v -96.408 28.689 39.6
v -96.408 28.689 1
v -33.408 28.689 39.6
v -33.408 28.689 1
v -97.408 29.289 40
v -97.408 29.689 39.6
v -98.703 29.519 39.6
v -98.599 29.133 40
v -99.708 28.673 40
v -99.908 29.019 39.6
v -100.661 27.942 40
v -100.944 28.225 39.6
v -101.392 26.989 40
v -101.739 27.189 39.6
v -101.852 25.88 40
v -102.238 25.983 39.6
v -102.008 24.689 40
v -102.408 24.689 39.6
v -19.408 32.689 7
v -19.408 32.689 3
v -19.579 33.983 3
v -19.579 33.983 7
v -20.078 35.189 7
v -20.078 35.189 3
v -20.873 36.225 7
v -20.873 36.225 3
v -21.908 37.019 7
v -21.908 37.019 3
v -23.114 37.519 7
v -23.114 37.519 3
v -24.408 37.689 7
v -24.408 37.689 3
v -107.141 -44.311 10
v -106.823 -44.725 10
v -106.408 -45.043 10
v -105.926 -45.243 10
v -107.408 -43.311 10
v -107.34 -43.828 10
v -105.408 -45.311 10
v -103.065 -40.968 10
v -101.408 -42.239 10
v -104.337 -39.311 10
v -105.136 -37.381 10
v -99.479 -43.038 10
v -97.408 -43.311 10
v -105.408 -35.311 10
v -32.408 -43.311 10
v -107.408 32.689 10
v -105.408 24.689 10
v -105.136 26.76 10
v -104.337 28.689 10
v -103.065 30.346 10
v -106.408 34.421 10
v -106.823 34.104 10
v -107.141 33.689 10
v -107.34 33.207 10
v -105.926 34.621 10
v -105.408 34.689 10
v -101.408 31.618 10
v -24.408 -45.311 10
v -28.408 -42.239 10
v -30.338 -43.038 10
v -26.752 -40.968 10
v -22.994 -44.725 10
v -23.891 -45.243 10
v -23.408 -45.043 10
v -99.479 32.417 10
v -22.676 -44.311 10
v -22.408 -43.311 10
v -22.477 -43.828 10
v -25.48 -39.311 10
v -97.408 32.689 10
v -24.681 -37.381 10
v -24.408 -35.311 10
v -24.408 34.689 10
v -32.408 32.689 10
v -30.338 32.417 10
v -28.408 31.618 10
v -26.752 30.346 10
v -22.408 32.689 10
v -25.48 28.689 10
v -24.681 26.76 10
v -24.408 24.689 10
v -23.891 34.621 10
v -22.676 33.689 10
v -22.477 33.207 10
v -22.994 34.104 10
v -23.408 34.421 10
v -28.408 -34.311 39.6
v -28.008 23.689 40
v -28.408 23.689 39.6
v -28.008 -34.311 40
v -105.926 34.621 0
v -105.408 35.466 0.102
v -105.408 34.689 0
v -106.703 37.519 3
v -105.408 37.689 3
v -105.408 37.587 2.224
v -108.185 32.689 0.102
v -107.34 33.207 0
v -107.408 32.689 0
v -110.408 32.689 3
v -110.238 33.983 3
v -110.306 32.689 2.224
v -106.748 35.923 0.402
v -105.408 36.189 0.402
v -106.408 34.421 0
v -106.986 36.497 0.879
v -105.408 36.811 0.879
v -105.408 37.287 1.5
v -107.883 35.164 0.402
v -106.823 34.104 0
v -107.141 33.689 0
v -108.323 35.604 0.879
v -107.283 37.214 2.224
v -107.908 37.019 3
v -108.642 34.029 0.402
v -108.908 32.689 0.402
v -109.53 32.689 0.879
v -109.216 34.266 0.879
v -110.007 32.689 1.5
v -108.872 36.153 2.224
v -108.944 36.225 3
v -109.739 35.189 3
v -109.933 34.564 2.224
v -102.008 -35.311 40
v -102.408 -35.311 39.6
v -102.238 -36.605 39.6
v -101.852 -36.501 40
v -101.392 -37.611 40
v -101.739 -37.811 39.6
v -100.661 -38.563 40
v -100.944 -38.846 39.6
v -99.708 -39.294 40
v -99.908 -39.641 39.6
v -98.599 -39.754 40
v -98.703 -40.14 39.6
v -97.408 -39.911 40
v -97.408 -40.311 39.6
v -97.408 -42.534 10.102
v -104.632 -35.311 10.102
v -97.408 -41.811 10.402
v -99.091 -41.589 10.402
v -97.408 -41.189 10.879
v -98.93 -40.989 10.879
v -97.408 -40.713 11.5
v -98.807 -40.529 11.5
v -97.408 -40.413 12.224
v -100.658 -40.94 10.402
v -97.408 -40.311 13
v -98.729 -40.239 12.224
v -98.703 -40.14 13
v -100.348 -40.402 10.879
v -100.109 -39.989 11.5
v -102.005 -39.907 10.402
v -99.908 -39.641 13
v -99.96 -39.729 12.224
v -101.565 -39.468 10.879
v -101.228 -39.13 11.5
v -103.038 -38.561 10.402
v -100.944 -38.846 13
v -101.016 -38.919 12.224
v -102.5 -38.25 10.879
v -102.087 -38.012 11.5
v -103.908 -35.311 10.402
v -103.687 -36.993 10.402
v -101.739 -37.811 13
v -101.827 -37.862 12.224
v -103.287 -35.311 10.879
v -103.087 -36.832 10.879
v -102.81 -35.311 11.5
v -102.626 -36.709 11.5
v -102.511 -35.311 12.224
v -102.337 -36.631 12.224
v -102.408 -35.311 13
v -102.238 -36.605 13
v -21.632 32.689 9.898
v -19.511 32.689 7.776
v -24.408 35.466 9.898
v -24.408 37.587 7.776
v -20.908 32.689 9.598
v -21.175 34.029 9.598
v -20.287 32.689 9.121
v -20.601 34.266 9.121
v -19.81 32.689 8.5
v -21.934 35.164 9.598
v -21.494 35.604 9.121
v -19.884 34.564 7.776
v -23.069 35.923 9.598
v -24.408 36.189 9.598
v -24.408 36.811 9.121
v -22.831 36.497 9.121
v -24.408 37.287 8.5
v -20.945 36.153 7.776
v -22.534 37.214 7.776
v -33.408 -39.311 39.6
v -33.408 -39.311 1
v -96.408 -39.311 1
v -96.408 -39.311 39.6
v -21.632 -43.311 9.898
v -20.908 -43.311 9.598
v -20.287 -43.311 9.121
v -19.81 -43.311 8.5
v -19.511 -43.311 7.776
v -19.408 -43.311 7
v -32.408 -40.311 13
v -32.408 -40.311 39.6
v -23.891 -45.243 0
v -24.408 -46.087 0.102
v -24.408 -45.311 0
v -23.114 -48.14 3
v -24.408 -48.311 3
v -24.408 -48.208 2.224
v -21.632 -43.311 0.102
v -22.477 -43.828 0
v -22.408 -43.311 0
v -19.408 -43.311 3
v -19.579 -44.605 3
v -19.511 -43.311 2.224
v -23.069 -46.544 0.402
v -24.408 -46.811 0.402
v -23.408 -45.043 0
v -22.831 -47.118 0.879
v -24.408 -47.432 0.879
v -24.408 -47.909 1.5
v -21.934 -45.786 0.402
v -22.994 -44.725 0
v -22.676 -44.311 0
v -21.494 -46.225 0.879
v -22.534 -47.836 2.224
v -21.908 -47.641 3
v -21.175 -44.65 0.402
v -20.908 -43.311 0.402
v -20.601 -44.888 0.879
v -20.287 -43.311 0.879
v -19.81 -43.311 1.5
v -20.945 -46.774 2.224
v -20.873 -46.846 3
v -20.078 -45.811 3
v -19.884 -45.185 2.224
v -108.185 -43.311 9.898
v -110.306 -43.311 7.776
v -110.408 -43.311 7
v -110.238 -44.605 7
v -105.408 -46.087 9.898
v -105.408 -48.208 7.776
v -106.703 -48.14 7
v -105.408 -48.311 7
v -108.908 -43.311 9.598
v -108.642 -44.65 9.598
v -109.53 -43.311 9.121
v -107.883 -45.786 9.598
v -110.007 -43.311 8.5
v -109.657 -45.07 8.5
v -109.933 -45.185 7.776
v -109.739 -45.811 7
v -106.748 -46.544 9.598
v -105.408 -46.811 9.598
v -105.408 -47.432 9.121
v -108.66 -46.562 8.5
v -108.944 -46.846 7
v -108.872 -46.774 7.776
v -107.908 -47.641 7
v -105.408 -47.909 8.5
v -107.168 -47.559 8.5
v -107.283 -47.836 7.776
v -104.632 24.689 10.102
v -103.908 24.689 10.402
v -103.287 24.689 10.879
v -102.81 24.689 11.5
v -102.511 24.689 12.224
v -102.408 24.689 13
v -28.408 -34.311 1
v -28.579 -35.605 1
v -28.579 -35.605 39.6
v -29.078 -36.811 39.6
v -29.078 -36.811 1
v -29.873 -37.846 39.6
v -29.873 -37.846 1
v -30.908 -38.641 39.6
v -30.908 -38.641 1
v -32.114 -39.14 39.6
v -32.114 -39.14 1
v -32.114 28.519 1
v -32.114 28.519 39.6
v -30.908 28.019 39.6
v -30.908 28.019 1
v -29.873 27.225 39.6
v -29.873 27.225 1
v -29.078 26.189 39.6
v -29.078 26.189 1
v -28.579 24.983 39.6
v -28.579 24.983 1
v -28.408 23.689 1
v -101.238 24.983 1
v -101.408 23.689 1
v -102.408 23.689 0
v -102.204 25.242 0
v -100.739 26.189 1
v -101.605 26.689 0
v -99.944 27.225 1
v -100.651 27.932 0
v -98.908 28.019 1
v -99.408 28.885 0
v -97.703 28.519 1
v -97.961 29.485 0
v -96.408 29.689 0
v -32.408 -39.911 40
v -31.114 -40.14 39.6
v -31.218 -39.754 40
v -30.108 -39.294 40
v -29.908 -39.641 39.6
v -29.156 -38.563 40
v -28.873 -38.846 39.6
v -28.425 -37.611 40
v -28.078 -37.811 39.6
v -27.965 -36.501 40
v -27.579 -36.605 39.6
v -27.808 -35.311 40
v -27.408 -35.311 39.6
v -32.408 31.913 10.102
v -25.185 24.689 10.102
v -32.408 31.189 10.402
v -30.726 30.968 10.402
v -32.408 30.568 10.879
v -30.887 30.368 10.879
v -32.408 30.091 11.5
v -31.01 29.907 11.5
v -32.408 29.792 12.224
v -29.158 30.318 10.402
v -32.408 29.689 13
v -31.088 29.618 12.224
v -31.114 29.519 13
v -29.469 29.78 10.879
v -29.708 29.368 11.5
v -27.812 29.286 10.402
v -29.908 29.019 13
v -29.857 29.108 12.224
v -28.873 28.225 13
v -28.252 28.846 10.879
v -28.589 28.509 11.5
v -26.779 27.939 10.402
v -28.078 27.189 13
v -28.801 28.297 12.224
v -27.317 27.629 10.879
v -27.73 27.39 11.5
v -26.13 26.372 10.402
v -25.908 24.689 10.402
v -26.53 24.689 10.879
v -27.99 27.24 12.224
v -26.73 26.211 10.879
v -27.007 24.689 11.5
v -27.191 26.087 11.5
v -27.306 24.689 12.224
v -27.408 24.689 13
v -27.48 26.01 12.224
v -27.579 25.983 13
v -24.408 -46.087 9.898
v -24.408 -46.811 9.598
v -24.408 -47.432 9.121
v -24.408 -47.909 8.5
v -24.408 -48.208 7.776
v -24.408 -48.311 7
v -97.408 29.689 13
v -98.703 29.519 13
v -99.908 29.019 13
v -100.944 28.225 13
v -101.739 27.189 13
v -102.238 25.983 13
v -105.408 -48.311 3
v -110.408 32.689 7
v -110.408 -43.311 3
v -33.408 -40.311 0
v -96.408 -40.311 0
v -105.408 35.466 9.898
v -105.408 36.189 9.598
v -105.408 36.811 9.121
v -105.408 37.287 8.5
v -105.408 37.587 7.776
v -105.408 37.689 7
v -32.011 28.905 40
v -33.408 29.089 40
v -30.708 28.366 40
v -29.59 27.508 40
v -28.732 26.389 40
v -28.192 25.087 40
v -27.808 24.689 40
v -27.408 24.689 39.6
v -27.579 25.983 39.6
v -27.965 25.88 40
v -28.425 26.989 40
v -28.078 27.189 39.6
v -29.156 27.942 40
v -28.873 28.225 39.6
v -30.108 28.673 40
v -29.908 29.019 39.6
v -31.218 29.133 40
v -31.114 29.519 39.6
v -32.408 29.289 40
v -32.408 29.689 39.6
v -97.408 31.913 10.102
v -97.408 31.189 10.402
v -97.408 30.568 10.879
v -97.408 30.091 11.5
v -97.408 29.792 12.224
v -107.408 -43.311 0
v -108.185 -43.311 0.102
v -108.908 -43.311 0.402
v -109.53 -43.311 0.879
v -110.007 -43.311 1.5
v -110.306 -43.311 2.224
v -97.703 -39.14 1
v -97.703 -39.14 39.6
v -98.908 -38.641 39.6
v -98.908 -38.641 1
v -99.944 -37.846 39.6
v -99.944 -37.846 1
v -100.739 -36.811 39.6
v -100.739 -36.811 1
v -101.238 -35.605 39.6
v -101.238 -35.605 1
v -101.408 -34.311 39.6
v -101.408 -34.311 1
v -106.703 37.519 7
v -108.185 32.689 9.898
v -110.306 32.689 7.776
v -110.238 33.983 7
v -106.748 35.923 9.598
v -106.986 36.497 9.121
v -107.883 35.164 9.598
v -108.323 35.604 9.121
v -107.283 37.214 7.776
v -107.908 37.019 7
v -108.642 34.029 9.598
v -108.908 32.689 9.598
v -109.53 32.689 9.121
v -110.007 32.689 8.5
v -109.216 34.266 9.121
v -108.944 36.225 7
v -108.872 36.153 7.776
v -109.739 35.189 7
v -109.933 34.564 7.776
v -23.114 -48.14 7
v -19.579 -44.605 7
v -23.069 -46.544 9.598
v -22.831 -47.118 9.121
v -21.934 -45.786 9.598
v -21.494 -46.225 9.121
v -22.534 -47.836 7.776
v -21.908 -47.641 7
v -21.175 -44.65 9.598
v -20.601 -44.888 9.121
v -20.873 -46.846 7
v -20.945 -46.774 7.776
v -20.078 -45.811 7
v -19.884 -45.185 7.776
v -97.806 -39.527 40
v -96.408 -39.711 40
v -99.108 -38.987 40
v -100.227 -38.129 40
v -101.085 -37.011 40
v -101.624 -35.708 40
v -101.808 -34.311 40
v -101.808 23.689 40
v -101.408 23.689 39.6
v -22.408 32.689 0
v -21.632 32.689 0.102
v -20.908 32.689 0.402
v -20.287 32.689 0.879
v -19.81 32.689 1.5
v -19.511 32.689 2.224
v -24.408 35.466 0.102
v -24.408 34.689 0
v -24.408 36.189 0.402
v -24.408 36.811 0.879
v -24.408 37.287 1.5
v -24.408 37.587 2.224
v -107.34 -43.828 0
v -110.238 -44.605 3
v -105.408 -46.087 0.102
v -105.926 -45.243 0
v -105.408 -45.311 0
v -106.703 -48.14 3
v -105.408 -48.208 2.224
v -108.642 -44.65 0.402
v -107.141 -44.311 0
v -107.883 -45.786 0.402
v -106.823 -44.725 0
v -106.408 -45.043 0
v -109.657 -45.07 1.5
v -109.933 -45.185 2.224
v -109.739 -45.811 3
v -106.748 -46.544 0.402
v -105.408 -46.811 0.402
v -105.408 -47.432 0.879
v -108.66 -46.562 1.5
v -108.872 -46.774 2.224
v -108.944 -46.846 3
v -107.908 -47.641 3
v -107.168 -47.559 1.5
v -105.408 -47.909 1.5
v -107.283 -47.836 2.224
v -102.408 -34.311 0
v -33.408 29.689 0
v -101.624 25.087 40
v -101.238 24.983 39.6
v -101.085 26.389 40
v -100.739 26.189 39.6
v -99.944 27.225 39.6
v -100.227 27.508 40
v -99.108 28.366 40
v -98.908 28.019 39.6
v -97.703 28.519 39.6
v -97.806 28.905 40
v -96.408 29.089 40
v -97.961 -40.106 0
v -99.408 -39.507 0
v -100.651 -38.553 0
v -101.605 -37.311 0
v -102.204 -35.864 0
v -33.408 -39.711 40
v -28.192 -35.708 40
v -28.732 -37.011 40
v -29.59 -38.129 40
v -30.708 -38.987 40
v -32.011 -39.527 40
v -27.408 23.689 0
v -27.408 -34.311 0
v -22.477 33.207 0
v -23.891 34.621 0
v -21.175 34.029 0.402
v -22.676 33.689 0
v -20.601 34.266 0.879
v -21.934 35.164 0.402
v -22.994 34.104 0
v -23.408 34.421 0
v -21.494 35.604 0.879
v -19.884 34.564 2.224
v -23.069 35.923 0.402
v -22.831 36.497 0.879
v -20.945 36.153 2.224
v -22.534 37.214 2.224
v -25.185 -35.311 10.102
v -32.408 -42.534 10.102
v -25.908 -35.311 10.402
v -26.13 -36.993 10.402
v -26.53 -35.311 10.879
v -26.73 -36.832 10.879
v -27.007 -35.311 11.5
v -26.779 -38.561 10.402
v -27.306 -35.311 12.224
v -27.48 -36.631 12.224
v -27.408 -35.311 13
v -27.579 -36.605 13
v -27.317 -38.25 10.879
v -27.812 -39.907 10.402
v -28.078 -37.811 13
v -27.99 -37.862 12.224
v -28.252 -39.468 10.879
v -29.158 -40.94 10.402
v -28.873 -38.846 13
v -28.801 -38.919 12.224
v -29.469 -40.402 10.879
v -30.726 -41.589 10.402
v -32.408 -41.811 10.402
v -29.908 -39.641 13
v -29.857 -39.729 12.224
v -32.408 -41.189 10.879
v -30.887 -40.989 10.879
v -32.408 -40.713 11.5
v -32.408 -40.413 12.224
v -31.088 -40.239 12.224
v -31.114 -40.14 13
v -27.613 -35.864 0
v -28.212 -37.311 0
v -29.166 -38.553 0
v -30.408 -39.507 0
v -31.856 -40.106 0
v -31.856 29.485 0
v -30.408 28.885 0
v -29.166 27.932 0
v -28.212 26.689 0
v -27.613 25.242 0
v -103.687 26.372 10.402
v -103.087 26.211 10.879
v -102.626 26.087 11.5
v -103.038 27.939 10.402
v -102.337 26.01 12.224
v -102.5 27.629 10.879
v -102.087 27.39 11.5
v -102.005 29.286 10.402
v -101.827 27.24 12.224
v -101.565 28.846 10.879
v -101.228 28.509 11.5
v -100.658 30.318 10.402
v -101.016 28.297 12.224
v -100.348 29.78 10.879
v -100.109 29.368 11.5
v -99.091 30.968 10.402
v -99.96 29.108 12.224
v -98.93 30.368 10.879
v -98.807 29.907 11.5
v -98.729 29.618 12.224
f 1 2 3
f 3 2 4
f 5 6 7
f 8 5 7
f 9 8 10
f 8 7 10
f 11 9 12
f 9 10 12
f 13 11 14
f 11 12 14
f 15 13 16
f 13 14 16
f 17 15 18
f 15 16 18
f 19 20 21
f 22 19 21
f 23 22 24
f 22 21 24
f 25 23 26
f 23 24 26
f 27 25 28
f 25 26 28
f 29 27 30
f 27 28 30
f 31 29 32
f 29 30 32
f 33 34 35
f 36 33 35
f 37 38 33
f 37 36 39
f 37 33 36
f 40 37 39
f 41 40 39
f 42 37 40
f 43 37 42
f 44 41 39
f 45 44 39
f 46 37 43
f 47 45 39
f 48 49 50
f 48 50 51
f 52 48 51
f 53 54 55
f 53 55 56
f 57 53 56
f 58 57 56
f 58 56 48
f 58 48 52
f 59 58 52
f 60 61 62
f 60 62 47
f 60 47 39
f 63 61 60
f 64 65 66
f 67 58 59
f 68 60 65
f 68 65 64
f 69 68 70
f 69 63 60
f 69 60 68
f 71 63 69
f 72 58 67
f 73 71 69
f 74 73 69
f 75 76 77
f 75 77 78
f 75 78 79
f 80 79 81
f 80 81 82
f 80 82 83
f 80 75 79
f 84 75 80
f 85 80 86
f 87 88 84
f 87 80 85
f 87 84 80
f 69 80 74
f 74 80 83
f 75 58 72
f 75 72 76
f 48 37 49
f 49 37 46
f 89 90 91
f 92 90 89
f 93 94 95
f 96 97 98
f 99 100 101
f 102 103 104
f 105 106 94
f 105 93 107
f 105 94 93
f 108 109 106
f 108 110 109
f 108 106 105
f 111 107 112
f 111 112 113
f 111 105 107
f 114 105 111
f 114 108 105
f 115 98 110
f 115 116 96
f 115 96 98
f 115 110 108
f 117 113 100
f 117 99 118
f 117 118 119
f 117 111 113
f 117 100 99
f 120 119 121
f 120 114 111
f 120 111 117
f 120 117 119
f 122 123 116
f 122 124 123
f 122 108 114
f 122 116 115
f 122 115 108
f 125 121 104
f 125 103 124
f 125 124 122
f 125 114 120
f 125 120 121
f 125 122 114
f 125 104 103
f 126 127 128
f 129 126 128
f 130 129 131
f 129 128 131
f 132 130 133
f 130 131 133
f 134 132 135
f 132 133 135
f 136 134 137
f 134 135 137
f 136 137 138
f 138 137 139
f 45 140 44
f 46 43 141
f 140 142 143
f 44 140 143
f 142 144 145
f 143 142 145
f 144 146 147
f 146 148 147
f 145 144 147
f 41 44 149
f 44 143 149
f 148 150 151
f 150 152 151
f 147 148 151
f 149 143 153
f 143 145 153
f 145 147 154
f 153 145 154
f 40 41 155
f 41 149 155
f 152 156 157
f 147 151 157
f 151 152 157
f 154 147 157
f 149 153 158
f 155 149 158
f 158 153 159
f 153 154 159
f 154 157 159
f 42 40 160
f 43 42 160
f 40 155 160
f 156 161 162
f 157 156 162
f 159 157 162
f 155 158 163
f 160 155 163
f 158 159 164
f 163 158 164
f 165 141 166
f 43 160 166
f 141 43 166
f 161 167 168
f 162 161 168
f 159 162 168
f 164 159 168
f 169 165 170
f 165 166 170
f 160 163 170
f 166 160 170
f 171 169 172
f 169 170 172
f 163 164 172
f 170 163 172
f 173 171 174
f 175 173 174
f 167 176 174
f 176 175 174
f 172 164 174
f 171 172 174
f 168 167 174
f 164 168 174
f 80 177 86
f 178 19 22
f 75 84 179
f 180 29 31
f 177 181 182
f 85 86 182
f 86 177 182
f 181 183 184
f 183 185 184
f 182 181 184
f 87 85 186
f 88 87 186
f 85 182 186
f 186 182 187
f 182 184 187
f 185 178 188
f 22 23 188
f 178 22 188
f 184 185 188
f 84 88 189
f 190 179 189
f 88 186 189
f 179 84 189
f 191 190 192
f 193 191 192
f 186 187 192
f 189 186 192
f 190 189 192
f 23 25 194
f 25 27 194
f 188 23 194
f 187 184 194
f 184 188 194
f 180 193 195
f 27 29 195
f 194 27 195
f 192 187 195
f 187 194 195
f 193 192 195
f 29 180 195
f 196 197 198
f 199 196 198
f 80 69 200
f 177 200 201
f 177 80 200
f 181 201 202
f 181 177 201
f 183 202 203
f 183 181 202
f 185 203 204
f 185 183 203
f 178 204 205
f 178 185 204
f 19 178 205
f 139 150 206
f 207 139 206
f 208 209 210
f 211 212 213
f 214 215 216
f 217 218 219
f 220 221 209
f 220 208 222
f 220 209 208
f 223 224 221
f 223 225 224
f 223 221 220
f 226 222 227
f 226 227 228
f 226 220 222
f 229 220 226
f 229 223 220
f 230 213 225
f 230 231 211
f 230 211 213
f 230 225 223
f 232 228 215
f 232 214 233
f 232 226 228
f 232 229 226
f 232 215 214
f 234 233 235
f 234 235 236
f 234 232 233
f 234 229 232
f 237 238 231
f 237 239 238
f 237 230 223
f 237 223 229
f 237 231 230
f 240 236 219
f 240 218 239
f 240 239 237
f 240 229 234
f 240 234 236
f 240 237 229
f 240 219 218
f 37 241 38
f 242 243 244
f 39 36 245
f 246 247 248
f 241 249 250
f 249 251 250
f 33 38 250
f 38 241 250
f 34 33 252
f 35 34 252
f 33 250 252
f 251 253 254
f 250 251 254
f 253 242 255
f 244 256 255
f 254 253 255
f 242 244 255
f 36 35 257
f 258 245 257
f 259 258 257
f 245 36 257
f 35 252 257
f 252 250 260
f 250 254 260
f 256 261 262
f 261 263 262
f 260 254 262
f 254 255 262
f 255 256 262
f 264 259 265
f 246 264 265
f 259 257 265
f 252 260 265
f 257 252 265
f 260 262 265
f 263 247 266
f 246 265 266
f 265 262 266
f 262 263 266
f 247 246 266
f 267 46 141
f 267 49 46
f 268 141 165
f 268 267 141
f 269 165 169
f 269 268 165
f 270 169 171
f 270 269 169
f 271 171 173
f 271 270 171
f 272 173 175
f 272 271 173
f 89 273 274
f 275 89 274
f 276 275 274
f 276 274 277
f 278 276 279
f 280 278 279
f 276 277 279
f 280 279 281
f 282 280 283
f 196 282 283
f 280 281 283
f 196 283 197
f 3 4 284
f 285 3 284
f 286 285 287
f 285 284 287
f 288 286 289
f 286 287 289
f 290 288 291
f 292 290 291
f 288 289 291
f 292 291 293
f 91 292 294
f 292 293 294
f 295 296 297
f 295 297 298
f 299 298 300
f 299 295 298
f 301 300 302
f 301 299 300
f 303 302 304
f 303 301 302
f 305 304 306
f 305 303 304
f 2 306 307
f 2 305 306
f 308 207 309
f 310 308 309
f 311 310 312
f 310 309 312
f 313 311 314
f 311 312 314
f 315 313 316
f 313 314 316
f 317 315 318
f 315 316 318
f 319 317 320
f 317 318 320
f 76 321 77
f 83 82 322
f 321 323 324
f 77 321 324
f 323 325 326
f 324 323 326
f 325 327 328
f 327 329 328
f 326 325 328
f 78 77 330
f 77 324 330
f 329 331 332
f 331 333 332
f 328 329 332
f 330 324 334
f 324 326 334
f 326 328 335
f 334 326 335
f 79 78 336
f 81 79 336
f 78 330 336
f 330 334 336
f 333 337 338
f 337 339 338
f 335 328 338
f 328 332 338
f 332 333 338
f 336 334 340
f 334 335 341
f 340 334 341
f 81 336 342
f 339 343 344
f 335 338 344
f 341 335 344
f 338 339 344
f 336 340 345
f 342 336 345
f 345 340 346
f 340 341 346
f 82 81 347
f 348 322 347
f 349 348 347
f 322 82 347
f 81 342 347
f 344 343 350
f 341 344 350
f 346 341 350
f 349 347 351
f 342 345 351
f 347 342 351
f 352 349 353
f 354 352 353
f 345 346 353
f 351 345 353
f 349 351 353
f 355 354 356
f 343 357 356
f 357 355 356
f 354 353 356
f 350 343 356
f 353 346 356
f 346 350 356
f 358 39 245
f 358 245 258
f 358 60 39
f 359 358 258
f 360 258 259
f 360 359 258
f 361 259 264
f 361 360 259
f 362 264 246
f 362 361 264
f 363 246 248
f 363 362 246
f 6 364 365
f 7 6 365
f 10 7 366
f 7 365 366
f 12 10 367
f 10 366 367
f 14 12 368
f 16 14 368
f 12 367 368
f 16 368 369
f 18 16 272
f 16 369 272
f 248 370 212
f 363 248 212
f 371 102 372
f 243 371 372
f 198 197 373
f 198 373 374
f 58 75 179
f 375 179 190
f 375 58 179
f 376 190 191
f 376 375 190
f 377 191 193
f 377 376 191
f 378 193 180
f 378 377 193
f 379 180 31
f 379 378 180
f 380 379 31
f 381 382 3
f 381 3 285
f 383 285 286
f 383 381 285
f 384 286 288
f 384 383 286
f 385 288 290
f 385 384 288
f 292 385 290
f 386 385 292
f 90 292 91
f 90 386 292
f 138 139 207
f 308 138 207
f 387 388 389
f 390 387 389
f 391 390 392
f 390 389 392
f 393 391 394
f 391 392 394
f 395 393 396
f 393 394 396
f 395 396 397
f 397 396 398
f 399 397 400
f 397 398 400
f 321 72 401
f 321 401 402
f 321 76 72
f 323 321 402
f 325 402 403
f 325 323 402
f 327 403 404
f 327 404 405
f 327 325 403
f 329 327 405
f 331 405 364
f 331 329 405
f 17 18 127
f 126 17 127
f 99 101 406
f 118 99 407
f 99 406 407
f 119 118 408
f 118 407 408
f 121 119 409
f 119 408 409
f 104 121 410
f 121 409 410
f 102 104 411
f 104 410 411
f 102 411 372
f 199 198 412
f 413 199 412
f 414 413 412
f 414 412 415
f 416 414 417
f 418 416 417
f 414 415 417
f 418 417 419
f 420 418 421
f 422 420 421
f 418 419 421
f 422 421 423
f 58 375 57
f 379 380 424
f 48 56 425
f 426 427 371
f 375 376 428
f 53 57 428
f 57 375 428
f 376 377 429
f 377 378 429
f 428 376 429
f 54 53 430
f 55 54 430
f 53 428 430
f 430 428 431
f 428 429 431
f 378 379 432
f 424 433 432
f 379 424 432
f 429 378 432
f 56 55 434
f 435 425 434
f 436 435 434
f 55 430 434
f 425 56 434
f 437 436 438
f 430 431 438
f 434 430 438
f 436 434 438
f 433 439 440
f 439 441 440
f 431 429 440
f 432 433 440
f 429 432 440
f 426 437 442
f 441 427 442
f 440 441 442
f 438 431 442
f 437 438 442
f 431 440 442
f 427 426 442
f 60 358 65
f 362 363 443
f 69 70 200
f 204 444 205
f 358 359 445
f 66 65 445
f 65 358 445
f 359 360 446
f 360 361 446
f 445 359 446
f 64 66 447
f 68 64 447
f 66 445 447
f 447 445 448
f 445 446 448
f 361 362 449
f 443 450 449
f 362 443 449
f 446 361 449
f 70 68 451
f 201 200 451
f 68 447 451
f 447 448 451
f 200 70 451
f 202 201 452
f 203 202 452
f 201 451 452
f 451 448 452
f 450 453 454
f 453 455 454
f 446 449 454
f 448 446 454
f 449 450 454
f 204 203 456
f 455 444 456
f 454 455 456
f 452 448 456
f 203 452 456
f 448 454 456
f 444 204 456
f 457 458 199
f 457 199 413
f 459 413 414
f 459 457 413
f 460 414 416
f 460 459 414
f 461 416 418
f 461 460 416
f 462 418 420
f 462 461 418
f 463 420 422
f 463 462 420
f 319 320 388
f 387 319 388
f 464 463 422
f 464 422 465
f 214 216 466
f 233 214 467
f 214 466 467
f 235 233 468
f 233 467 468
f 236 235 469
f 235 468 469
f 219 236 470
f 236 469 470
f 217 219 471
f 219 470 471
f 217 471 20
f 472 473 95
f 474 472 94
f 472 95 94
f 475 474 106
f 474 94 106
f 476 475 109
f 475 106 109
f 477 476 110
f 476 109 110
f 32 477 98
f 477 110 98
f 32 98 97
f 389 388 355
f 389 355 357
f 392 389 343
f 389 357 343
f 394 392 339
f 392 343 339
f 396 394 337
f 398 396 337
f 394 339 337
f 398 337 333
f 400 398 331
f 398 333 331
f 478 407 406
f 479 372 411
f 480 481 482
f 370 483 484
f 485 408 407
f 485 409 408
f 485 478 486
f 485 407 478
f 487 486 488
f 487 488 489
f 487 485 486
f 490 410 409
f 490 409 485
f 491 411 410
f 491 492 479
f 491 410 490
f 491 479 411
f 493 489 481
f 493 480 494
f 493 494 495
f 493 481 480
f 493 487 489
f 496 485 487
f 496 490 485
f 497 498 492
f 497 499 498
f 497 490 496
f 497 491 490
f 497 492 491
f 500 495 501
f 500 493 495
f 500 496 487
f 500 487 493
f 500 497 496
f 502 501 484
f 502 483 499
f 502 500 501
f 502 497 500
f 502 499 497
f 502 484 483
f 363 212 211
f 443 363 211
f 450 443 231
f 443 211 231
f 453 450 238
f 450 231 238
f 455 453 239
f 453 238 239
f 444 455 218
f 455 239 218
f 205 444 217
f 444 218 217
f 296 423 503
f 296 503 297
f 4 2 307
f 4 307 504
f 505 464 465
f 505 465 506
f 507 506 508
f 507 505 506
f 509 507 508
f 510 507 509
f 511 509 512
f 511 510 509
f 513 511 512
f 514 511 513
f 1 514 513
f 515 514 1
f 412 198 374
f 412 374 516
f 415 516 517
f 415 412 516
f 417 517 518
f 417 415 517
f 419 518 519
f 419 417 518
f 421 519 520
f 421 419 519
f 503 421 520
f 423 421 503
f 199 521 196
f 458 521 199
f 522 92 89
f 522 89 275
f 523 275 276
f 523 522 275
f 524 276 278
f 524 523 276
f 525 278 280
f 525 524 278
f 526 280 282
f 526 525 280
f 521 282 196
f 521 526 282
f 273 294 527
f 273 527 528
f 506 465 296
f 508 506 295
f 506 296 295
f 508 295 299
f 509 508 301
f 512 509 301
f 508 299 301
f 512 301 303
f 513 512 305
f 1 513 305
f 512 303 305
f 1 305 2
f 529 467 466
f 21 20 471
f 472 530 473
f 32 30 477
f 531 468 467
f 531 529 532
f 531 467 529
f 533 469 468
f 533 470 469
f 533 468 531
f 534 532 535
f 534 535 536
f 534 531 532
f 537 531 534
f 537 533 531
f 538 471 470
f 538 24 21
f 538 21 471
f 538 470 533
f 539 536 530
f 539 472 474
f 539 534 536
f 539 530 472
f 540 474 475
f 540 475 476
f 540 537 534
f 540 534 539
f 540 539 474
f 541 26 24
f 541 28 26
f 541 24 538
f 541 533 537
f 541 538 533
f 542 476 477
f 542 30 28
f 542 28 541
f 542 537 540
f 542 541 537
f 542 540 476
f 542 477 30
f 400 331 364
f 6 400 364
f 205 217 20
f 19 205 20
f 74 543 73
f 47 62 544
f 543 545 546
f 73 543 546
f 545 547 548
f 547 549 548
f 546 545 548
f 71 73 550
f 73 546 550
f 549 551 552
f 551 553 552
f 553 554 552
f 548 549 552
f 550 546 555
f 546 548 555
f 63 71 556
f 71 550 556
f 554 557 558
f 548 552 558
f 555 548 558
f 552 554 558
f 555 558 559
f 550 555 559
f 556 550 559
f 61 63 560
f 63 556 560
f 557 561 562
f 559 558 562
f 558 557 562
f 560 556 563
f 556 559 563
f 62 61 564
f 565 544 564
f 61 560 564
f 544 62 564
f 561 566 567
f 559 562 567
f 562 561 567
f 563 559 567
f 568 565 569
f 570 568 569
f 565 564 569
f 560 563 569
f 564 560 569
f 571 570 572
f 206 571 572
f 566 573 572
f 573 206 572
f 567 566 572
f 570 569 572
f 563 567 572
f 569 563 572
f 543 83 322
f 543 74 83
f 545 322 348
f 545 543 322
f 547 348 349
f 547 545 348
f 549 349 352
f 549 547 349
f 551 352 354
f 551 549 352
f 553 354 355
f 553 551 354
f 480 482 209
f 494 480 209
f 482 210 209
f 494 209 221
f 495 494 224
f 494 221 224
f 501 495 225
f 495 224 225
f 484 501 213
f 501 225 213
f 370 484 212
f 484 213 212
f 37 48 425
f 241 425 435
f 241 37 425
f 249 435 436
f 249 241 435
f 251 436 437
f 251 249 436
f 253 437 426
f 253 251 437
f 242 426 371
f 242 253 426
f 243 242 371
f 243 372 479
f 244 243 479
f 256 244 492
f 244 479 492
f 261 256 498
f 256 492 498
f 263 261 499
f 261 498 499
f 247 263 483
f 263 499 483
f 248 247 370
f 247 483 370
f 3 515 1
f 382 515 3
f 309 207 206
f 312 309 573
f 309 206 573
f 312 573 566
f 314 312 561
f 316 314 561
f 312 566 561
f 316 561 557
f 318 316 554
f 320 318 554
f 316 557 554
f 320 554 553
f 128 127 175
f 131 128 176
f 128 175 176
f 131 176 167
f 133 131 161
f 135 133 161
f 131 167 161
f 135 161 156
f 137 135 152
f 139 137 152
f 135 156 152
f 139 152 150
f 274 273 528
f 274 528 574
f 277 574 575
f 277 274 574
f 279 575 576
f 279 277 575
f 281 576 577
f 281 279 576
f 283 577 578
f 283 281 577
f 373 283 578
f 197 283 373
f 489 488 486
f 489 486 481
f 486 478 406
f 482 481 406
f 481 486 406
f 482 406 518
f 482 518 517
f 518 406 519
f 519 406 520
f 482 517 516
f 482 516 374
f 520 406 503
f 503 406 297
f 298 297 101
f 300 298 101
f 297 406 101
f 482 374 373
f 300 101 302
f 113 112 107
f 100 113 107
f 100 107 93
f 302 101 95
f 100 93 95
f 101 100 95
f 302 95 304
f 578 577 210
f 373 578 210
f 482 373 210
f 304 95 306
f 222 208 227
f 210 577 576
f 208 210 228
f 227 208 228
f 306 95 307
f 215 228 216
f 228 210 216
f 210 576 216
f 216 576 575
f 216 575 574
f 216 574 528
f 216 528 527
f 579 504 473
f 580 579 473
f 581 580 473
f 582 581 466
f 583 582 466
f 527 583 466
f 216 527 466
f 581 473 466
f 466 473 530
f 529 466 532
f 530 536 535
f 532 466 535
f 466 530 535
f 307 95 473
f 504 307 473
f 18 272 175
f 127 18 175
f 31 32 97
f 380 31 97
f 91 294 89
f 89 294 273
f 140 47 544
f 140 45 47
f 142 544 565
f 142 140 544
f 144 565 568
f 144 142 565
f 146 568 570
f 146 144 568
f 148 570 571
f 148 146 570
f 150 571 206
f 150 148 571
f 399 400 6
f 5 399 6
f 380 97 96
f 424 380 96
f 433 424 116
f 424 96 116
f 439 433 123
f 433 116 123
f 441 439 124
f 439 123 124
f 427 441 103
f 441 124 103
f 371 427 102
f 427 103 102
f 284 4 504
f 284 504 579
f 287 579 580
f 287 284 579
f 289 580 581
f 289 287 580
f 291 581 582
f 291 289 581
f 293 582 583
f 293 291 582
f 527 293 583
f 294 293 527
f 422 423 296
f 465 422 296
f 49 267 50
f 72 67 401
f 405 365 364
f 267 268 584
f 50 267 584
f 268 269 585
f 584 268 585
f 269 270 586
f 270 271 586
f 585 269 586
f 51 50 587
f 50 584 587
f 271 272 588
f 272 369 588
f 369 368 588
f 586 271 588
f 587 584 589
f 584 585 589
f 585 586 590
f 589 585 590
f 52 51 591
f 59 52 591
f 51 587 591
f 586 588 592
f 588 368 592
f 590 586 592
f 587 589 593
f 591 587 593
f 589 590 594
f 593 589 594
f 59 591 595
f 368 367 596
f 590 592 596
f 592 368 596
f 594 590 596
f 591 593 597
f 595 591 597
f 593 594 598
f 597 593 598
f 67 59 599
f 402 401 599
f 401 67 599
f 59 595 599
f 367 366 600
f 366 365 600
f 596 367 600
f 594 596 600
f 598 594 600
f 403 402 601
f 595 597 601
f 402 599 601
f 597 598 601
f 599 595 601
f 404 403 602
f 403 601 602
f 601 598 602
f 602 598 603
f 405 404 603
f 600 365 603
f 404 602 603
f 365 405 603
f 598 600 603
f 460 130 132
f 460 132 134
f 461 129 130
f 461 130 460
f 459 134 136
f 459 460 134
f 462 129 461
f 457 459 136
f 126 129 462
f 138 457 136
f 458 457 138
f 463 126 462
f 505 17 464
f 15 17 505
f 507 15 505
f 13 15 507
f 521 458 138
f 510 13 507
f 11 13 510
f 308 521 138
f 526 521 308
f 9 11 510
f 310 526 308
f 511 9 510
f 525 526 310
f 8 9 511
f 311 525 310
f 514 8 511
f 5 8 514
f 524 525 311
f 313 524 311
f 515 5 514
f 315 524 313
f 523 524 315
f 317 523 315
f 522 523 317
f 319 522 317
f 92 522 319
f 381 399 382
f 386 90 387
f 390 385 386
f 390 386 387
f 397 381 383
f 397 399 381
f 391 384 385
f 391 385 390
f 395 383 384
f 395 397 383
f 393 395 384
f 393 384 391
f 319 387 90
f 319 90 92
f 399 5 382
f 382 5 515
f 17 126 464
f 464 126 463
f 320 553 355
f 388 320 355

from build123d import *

# Parameters (mm, degrees)
F1_DEPTH = 40
F2_DEPTH = 10
F3_R     = 3
F4_SIZE  = 0.4
F5_SIZE  = 1


with BuildPart() as f1:
    # F0 (on Top) → F1 (new body)
    with BuildSketch(Plane.XY):
        with BuildLine():
            Line((-32.408465, 29.689309), (-97.408465, 29.689309))
            ThreePointArc((-97.408465, 29.689309), (-100.943999, 28.224843), (-102.408465, 24.689309))
            Line((-102.408465, 24.689309), (-102.408465, -35.310691))
            ThreePointArc((-102.408465, -35.310691), (-100.943999, -38.846224), (-97.408465, -40.310691))
            Line((-97.408465, -40.310691), (-32.408465, -40.310691))
            ThreePointArc((-32.408465, -40.310691), (-28.872931, -38.846224), (-27.408465, -35.310691))
            Line((-27.408465, -35.310691), (-27.408465, 24.689309))
            ThreePointArc((-27.408465, 24.689309), (-28.872931, 28.224843), (-32.408465, 29.689309))
        make_face()
        with BuildLine():
            Line((-101.408465, -34.310691), (-101.408465, 23.689309))
            ThreePointArc((-101.408465, 23.689309), (-99.943999, 27.224843), (-96.408465, 28.689309))
            Line((-96.408465, 28.689309), (-33.408465, 28.689309))
            ThreePointArc((-33.408465, 28.689309), (-29.872931, 27.224843), (-28.408465, 23.689309))
            Line((-28.408465, 23.689309), (-28.408465, -34.310691))
            ThreePointArc((-28.408465, -34.310691), (-29.872931, -37.846224), (-33.408465, -39.310691))
            Line((-33.408465, -39.310691), (-96.408465, -39.310691))
            ThreePointArc((-96.408465, -39.310691), (-99.943999, -37.846224), (-101.408465, -34.310691))
        make_face(mode=Mode.SUBTRACT)
    extrude(amount=F1_DEPTH)

    # F0 (on Top) → F2 (join)
    with BuildSketch(Plane.XY):
        with BuildLine():
            Line((-24.408465, 37.689309), (-105.408465, 37.689309))
            ThreePointArc((-105.408465, 37.689309), (-108.943999, 36.224843), (-110.408465, 32.689309))
            Line((-110.408465, 32.689309), (-110.408465, -43.310691))
            ThreePointArc((-110.408465, -43.310691), (-108.943999, -46.846224), (-105.408465, -48.310691))
            Line((-105.408465, -48.310691), (-24.408465, -48.310691))
            ThreePointArc((-24.408465, -48.310691), (-20.872931, -46.846224), (-19.408465, -43.310691))
            Line((-19.408465, -43.310691), (-19.408465, 32.689309))
            ThreePointArc((-19.408465, 32.689309), (-20.872931, 36.224843), (-24.408465, 37.689309))
        make_face()
        with BuildLine():
            Line((-105.408465, -38.310691), (-105.408465, 27.689309))
            ThreePointArc((-105.408465, 27.689309), (-103.943999, 31.224843), (-100.408465, 32.689309))
            Line((-100.408465, 32.689309), (-29.408465, 32.689309))
            ThreePointArc((-29.408465, 32.689309), (-25.872931, 31.224843), (-24.408465, 27.689309))
            Line((-24.408465, 27.689309), (-24.408465, -38.310691))
            ThreePointArc((-24.408465, -38.310691), (-25.872931, -41.846224), (-29.408465, -43.310691))
            Line((-29.408465, -43.310691), (-100.408465, -43.310691))
            ThreePointArc((-100.408465, -43.310691), (-103.943999, -41.846224), (-105.408465, -38.310691))
        make_face(mode=Mode.SUBTRACT)
        with BuildLine():
            ThreePointArc((-100.408465, 32.689309), (-103.943999, 31.224843), (-105.408465, 27.689309))
            Line((-105.408465, 27.689309), (-105.408465, -38.310691))
            ThreePointArc((-105.408465, -38.310691), (-103.943999, -41.846224), (-100.408465, -43.310691))
            Line((-100.408465, -43.310691), (-29.408465, -43.310691))
            ThreePointArc((-29.408465, -43.310691), (-25.872931, -41.846224), (-24.408465, -38.310691))
            Line((-24.408465, -38.310691), (-24.408465, 27.689309))
            ThreePointArc((-24.408465, 27.689309), (-25.872931, 31.224843), (-29.408465, 32.689309))
            Line((-29.408465, 32.689309), (-100.408465, 32.689309))
        make_face()
        with BuildLine():
            ThreePointArc((-102.408465, 24.689309), (-100.943999, 28.224843), (-97.408465, 29.689309))
            Line((-97.408465, 29.689309), (-32.408465, 29.689309))
            ThreePointArc((-32.408465, 29.689309), (-28.872931, 28.224843), (-27.408465, 24.689309))
            Line((-27.408465, 24.689309), (-27.408465, -35.310691))
            ThreePointArc((-27.408465, -35.310691), (-28.872931, -38.846224), (-32.408465, -40.310691))
            Line((-32.408465, -40.310691), (-97.408465, -40.310691))
            ThreePointArc((-97.408465, -40.310691), (-100.943999, -38.846224), (-102.408465, -35.310691))
            Line((-102.408465, -35.310691), (-102.408465, 24.689309))
        make_face(mode=Mode.SUBTRACT)
    extrude(amount=F2_DEPTH)

    # F3
    f3_edges = [f1.edges().sort_by_distance(p)[0] for p in [
        (-64.908465, -40.310691, 10),
        (-64.908465, -48.310691, 10),
        (-64.908465, -48.310691, 0),
    ]]
    fillet(f3_edges, radius=F3_R)

    # F4
    f4_edges = [f1.edges().sort_by_distance(p)[0] for p in [
        (-64.908465, -40.310691, 40),
        (-64.908465, -39.310691, 40),
    ]]
    chamfer(f4_edges, length=F4_SIZE)

    # F5
    f5_edges = [f1.edges().sort_by_distance(p)[0] for p in [
        (-101.408465, -5.310691, 0),
    ]]
    chamfer(f5_edges, length=F5_SIZE)


solid = f1.part
